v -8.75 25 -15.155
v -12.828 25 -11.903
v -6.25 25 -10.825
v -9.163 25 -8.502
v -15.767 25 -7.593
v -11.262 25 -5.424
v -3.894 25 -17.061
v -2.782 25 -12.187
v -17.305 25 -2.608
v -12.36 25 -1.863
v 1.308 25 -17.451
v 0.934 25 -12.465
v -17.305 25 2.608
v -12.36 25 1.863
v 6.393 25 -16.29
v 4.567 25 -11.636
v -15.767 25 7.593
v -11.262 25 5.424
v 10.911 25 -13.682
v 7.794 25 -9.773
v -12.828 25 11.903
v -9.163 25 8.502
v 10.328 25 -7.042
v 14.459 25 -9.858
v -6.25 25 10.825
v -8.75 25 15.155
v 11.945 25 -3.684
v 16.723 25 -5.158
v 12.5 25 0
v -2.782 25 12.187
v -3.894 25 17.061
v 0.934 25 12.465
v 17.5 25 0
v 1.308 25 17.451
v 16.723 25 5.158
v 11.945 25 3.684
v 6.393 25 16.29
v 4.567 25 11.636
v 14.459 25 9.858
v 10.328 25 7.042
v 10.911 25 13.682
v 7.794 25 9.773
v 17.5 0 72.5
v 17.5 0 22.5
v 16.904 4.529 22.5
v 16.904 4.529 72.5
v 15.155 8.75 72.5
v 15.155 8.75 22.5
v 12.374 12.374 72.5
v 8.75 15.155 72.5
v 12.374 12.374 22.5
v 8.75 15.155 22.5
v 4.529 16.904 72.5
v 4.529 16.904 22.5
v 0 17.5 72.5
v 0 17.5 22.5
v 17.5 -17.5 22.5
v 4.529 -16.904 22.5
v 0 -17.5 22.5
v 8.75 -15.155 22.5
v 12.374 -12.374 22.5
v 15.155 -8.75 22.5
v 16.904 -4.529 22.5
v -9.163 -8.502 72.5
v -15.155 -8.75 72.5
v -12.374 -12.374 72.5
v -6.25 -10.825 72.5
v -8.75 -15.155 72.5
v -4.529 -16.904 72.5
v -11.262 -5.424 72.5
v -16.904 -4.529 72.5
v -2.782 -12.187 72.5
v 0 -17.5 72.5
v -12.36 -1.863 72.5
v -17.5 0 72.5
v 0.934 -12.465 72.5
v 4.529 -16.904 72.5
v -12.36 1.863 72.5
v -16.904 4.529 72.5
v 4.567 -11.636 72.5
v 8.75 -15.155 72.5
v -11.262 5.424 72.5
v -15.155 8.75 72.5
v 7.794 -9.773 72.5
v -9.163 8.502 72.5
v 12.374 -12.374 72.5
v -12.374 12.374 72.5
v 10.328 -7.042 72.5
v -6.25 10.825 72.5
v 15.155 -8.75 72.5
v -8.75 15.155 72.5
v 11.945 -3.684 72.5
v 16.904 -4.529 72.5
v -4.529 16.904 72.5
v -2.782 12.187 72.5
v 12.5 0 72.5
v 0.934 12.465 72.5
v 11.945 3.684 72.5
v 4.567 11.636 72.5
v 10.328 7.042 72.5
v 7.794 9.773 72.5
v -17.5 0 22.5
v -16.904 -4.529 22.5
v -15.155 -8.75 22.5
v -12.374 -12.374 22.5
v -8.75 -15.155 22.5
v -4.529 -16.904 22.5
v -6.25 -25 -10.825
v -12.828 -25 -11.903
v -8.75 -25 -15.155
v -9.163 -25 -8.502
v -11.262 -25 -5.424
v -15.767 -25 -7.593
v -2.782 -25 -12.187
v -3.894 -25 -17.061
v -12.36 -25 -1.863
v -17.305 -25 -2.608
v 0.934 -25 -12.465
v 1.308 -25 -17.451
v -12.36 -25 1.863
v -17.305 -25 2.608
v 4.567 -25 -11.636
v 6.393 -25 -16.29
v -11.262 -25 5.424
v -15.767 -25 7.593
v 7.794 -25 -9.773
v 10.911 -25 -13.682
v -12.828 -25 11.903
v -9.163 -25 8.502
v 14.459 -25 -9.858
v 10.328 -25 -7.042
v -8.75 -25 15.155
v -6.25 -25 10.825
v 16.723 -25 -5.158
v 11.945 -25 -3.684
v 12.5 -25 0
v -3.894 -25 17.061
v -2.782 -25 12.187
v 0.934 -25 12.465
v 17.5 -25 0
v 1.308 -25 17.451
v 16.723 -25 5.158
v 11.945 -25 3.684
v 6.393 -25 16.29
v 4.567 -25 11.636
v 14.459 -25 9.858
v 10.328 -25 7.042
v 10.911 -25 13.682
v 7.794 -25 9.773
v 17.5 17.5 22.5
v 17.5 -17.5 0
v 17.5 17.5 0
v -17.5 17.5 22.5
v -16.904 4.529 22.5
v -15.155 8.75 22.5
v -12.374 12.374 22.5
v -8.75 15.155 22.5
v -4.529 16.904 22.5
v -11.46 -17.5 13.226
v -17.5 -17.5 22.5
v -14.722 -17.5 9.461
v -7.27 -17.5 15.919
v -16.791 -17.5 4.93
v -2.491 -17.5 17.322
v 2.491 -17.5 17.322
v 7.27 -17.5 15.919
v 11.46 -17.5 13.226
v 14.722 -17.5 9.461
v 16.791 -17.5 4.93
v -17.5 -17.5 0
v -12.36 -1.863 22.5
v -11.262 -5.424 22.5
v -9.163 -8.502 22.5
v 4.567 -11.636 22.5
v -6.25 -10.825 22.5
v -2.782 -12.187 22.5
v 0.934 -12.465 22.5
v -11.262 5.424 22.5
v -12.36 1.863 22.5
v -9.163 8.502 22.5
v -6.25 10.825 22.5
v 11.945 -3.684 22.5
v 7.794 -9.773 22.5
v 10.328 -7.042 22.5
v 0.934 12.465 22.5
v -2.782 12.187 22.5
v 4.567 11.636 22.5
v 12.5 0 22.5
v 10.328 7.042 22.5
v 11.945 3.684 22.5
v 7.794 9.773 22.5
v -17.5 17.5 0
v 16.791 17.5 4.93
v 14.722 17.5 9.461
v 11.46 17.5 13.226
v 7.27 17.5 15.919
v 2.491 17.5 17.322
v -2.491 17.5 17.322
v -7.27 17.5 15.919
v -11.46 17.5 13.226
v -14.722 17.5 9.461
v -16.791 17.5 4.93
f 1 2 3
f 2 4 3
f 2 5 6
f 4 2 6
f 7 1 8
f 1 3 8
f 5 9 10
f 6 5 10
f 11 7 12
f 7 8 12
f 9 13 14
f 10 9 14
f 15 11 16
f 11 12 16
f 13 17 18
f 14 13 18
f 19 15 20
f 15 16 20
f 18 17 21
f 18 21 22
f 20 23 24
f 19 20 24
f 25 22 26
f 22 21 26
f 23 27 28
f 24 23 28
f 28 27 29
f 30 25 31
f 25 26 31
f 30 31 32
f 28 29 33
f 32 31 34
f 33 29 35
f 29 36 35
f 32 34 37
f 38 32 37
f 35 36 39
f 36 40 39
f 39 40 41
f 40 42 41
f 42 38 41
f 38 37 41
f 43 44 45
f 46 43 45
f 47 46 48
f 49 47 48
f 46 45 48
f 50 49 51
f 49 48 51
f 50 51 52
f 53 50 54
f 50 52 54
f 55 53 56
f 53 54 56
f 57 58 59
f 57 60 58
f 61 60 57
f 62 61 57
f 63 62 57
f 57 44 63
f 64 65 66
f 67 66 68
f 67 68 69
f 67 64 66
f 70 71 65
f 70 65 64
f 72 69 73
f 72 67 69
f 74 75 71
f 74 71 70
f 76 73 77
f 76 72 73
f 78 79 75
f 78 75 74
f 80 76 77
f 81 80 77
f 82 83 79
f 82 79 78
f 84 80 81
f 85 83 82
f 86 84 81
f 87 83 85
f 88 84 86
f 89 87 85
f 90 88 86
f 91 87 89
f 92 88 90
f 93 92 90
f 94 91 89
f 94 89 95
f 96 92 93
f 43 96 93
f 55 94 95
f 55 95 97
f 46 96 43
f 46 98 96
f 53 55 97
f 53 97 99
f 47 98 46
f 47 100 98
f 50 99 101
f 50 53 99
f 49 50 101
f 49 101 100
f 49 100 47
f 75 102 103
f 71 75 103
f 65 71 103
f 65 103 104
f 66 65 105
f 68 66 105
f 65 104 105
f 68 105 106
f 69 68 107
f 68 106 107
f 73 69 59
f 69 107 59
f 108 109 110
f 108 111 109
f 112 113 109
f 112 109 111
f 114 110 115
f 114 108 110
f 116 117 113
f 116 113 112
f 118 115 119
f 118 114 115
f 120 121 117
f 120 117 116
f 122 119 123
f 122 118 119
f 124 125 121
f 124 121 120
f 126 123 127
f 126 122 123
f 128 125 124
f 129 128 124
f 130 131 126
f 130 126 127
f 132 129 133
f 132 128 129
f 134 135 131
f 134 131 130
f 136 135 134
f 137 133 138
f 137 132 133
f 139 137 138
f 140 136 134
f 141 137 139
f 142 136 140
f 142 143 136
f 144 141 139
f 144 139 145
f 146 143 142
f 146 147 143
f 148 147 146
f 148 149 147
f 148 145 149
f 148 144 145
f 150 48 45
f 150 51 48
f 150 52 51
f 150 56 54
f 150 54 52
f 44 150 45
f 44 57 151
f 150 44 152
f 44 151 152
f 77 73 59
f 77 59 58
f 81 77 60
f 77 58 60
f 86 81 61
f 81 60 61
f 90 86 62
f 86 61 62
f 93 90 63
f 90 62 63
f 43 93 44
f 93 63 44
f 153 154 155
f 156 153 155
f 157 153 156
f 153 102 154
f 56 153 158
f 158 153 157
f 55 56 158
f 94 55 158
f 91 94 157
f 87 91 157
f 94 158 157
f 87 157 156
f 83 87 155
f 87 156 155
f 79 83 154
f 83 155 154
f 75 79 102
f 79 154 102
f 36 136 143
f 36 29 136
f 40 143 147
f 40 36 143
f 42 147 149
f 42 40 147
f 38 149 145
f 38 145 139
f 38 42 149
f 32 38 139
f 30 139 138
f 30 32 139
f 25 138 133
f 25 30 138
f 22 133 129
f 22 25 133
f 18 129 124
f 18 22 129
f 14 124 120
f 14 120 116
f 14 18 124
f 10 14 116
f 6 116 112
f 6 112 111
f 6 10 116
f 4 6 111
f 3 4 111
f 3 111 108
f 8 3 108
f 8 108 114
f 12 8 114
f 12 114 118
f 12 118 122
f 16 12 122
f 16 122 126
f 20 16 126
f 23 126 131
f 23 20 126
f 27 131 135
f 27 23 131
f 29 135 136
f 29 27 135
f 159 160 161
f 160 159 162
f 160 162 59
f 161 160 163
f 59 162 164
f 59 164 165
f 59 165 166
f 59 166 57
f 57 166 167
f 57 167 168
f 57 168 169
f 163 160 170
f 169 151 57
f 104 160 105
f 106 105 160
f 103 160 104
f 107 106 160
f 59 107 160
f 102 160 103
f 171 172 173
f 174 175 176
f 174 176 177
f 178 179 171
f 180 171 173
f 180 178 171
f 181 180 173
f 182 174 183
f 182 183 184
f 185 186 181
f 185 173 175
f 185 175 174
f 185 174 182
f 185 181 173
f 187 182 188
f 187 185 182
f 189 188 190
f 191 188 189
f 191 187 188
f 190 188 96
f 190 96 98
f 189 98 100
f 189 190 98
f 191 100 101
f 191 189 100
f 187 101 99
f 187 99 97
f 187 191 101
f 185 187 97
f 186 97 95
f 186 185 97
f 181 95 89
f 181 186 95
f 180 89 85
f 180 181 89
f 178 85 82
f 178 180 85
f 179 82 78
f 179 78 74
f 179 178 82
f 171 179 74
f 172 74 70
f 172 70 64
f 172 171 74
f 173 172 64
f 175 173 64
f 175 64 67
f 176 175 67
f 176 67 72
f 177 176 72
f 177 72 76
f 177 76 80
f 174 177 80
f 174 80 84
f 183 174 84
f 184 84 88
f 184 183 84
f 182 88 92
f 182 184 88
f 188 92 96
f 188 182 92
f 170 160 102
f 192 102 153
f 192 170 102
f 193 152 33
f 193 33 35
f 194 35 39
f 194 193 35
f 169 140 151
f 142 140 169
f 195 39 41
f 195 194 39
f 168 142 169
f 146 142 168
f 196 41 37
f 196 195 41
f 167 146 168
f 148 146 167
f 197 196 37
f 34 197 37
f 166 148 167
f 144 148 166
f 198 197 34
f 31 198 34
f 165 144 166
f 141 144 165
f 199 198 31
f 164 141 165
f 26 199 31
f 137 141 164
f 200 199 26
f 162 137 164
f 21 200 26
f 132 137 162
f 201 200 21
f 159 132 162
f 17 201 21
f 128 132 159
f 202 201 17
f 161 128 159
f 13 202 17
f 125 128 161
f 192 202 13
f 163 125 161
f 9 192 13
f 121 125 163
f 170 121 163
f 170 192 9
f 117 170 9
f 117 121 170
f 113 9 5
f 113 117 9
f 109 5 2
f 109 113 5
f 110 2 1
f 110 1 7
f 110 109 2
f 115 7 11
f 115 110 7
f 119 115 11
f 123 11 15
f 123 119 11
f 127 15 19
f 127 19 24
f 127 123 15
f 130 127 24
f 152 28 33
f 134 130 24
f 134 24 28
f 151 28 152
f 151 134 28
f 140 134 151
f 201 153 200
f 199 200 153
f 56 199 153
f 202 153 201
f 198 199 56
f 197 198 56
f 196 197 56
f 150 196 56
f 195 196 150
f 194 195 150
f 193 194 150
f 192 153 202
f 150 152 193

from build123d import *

# Parameters (mm, degrees)
F0_R     = 17.5
F0_R_2   = 12.5
F1_DEPTH = 25
F2_W     = 35
F2_H     = 35
F3_DEPTH = 22.5
F4_R     = 12.5
F5_DEPTH = 50
F6_DEPTH = 35


with BuildPart() as f1:
    # F0 (on Front) → F1 (new body, symmetric)
    with BuildSketch(Plane.XZ):
        Circle(F0_R)
        Circle(F0_R_2, mode=Mode.SUBTRACT)
    extrude(amount=F1_DEPTH, both=True)

    # F2 (on Top) → F3 (join)
    with BuildSketch(Plane.XY):
        Rectangle(F2_W, F2_H)
    extrude(amount=F3_DEPTH)

    # F4 (on face) → F5 (join)
    with BuildSketch(Plane.XY.offset(22.5)):
        with BuildLine():
            ThreePointArc((3.33e-08, -17.5), (12.3743686825, -12.374368659), (17.5, 0))
            ThreePointArc((17.5, 0), (12.3743686917, 12.3743686498), (5.93e-08, 17.5))
            ThreePointArc((5.93e-08, 17.5), (-12.3743686571, 12.3743686844), (-17.5, -2.06e-08))
            ThreePointArc((-17.5, -2.06e-08), (-12.3743686517, -12.3743686898), (3.33e-08, -17.5))
        make_face()
        Circle(F4_R, mode=Mode.SUBTRACT)
    extrude(amount=F5_DEPTH)

    # F6 (cut, through all): a face of the model
    f6_faces = [f1.faces().sort_by_distance(p)[0] for p in [
        (0, -17.5, 5.3051647697),
    ]]
    extrude(f6_faces, amount=-F6_DEPTH, mode=Mode.SUBTRACT)


solid = f1.part
